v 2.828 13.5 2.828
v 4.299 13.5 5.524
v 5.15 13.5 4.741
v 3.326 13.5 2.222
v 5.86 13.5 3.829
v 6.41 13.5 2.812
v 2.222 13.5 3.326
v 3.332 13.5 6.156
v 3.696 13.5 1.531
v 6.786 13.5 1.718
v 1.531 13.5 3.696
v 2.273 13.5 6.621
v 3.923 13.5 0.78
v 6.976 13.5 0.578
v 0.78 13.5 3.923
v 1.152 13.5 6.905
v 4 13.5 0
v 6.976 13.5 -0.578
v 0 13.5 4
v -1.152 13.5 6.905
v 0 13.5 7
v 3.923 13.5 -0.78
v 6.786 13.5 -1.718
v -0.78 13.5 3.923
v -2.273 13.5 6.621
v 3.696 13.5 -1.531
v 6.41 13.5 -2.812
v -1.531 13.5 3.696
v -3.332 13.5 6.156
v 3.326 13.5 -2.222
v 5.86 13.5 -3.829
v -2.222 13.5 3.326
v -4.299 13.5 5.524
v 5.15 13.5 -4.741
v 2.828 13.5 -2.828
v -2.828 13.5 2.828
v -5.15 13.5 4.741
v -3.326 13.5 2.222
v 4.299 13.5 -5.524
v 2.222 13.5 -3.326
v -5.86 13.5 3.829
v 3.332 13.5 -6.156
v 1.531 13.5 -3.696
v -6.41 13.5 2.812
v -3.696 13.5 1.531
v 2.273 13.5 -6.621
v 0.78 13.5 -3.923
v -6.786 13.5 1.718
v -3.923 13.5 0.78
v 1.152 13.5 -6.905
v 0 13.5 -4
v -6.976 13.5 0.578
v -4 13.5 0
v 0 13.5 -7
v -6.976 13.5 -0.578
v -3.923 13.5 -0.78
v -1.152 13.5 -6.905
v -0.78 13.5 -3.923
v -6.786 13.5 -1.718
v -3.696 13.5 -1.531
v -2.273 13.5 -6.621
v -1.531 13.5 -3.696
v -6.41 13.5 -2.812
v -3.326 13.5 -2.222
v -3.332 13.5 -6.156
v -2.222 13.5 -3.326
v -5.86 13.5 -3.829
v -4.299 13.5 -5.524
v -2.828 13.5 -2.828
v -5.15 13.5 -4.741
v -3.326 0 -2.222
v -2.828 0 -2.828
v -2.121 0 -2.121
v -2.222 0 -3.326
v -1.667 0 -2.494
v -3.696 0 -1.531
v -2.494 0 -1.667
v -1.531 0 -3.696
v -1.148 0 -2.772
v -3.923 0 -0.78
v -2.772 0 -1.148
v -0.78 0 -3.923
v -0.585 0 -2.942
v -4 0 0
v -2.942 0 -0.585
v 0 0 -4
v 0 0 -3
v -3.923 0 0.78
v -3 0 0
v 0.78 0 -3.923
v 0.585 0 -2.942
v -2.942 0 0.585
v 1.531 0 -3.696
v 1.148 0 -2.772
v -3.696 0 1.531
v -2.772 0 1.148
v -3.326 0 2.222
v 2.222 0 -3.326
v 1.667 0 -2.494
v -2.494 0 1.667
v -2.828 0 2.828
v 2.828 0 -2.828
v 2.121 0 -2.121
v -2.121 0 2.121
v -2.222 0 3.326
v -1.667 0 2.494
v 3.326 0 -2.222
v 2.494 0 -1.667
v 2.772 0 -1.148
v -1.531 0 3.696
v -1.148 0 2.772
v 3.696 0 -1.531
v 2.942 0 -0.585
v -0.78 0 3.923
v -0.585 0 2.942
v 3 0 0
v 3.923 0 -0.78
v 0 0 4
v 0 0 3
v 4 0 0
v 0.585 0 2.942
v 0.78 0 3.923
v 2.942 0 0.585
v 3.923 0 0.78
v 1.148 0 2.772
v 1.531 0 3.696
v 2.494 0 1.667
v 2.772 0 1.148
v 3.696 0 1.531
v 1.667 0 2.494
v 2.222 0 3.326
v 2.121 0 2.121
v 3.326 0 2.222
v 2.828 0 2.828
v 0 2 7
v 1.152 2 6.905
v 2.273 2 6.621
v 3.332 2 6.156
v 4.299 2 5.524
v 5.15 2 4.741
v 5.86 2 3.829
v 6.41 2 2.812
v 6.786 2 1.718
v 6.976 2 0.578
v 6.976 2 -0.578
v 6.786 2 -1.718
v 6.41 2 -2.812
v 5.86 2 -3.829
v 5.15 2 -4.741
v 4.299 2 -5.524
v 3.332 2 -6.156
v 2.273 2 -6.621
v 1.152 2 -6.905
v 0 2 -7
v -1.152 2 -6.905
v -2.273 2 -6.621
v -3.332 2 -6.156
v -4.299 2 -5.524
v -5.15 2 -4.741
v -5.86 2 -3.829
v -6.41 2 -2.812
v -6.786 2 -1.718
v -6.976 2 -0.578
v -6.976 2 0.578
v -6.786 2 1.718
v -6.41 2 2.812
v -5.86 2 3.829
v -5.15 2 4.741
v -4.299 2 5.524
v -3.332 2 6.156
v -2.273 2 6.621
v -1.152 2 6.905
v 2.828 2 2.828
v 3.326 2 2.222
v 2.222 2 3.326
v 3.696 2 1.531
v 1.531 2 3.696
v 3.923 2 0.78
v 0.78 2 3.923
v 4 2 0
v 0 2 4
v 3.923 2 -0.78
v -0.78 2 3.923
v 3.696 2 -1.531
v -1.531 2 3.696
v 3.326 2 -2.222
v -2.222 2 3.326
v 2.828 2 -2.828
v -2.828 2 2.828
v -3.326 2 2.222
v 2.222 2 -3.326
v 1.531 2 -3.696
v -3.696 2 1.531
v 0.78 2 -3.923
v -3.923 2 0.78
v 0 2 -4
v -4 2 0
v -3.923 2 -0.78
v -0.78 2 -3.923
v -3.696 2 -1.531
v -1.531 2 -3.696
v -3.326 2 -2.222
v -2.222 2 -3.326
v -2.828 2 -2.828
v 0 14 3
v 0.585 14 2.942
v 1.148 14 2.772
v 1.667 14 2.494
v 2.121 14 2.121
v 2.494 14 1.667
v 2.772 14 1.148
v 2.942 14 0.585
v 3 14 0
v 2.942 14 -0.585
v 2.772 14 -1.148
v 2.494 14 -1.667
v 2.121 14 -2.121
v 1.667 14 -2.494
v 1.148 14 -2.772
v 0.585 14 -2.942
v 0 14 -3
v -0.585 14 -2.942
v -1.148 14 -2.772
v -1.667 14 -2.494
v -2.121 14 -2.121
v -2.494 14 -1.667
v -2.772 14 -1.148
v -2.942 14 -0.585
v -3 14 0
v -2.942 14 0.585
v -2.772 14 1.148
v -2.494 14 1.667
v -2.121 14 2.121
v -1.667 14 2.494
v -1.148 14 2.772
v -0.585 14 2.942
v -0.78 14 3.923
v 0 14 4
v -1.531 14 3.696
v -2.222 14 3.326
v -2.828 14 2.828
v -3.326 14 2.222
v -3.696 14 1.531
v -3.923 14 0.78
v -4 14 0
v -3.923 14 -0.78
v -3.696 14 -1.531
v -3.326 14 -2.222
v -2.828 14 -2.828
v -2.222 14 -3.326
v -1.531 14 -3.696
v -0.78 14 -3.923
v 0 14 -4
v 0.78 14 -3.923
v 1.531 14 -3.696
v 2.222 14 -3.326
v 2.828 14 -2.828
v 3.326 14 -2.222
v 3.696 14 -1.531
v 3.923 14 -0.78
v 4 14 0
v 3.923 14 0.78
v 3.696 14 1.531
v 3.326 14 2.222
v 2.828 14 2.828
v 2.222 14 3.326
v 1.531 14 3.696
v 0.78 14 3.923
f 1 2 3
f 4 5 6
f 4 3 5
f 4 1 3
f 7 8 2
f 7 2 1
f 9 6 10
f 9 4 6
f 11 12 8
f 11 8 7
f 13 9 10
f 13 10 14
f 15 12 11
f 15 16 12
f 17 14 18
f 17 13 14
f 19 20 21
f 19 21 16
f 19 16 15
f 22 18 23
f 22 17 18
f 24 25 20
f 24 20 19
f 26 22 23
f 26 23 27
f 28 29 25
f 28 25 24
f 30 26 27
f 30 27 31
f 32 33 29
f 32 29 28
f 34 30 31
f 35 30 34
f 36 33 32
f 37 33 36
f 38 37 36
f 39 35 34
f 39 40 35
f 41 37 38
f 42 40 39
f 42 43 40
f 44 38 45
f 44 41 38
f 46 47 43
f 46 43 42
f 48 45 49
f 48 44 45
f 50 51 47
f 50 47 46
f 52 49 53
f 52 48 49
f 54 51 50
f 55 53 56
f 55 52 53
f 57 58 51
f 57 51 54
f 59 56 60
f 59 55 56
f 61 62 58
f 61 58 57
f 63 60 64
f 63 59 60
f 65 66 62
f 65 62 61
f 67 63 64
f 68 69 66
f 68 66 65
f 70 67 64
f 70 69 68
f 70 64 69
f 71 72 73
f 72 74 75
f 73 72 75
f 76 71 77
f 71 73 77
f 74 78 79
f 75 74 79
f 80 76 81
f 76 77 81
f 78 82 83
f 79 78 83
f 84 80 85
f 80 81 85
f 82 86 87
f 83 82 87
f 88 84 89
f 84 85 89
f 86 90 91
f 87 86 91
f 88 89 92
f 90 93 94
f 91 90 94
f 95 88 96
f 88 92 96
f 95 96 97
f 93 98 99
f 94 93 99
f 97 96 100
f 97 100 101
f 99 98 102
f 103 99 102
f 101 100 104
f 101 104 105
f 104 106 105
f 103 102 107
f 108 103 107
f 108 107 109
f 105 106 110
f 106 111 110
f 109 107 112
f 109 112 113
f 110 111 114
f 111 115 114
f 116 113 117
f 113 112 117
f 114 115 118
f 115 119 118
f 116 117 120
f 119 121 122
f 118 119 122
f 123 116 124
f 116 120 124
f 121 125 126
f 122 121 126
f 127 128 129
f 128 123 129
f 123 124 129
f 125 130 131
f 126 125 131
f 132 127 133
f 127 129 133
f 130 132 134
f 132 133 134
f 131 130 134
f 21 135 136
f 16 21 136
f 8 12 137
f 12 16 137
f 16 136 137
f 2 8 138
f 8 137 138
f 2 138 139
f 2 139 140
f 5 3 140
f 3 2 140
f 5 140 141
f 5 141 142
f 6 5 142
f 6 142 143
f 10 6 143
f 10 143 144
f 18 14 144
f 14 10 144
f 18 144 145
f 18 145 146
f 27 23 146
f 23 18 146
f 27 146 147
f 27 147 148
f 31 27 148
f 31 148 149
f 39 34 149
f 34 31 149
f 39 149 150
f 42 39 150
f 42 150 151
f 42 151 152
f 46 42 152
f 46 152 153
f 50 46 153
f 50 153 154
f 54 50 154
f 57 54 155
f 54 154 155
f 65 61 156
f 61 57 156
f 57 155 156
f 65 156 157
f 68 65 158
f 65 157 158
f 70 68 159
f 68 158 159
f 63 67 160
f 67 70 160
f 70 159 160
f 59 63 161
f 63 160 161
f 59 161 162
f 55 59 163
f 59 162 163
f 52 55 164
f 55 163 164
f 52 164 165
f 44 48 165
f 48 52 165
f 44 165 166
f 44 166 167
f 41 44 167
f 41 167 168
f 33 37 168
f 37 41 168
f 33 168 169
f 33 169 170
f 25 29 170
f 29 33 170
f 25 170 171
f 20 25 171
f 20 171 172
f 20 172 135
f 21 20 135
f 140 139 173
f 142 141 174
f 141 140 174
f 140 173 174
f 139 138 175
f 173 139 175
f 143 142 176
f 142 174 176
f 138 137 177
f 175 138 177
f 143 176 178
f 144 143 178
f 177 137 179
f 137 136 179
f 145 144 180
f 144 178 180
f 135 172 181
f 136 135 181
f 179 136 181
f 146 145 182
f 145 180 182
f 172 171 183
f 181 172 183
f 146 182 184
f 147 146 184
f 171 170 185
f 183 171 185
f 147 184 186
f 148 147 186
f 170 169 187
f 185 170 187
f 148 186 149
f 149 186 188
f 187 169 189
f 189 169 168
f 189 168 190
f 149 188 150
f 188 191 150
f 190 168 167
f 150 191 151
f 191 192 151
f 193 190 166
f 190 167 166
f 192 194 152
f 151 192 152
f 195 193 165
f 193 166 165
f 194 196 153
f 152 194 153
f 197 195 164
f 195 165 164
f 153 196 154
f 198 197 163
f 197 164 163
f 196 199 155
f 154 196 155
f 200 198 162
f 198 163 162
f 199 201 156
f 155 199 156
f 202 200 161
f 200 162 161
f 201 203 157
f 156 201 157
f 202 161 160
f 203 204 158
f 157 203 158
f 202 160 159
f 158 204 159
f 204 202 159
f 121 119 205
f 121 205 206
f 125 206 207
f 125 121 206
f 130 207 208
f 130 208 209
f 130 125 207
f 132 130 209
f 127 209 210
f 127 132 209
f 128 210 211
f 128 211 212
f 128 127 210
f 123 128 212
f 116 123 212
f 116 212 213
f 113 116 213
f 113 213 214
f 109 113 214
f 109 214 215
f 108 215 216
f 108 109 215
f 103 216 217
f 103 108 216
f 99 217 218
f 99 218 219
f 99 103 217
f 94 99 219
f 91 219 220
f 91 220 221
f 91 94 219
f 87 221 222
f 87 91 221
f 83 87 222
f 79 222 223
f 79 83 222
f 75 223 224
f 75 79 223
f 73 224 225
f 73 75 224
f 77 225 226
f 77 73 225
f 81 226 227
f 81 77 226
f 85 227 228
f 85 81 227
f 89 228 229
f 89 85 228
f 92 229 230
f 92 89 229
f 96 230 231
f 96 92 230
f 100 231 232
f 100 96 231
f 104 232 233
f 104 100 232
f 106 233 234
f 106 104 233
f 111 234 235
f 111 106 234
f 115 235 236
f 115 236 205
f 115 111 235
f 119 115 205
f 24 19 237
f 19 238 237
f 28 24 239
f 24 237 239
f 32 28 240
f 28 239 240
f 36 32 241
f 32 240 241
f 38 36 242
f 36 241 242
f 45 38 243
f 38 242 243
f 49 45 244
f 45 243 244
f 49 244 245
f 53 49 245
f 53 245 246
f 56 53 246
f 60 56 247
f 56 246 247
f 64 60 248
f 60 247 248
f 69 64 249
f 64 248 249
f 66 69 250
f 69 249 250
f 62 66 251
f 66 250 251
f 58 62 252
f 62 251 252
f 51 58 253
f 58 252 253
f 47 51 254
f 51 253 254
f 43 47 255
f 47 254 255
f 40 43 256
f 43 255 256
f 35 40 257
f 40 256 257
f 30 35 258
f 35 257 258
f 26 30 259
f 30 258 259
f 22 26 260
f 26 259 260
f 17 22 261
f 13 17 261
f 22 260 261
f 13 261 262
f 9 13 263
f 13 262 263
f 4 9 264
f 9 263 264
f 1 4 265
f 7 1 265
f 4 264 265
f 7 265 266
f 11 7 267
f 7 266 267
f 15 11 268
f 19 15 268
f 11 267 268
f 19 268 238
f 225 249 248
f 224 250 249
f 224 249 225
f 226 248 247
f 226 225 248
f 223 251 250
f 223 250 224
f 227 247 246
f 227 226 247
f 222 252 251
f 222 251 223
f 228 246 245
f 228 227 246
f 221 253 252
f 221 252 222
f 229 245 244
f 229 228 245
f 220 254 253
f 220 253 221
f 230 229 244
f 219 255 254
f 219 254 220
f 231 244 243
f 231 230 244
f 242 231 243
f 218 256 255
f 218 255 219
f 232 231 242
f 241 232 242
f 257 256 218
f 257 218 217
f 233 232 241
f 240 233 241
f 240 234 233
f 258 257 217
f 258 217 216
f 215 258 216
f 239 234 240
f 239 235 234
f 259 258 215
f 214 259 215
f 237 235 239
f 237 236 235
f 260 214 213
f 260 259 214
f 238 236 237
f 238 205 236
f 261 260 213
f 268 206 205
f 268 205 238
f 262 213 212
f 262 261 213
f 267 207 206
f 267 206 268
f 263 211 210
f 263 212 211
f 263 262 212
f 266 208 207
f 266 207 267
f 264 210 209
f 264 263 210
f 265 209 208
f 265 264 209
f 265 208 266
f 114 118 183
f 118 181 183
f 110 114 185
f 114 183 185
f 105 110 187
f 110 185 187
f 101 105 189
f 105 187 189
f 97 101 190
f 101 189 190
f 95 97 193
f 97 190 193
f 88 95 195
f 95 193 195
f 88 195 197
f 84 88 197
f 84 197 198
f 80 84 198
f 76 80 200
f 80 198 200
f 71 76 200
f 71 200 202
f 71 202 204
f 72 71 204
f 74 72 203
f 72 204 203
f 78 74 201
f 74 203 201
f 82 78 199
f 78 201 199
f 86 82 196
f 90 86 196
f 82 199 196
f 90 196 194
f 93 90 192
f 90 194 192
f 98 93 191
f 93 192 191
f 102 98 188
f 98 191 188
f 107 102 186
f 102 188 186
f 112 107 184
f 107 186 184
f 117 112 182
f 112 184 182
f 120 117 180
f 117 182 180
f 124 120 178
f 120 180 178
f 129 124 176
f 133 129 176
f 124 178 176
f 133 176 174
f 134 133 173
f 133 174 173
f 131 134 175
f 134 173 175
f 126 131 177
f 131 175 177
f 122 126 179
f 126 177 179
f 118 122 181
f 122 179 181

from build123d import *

# Parameters (mm, degrees)
SKETCH1_R           = 7
SKETCH1_R_2         = 3
BOSS_EXTRUDE1_DEPTH = 14
SKETCH2_W           = 3
SKETCH2_H           = 2
SKETCH2_H_2         = 0.5


with BuildPart() as part:
    # Sketch1 → Boss-Extrude1 (new body)
    with BuildSketch(Plane(origin=(0, 0, 0), x_dir=(1, 0, 0), z_dir=(0, 1, 0))):
        with Locations(Location((0, 0, 0), (0, 0, 270))):
            Circle(SKETCH1_R)
        with Locations(Location((0, 0, 0), (0, 0, 270))):
            Circle(SKETCH1_R_2, mode=Mode.SUBTRACT)
    extrude(amount=BOSS_EXTRUDE1_DEPTH)

    # Sketch2 → Cut-Revolve1 (revolve, cut)
    with BuildSketch(Plane.XY, mode=Mode.PRIVATE) as cut_revolve1_sk:
        with Locations((5.5, 1)):
            Rectangle(SKETCH2_W, SKETCH2_H)
        with Locations((5.5, 13.75)):
            Rectangle(SKETCH2_W, SKETCH2_H_2)
    revolve(cut_revolve1_sk.sketch.rotate(Axis((0, 14, 0), (0, -1, 0)), 90), axis=Axis((0, 14, 0), (0, -1, 0)), mode=Mode.SUBTRACT)


solid = part.part
